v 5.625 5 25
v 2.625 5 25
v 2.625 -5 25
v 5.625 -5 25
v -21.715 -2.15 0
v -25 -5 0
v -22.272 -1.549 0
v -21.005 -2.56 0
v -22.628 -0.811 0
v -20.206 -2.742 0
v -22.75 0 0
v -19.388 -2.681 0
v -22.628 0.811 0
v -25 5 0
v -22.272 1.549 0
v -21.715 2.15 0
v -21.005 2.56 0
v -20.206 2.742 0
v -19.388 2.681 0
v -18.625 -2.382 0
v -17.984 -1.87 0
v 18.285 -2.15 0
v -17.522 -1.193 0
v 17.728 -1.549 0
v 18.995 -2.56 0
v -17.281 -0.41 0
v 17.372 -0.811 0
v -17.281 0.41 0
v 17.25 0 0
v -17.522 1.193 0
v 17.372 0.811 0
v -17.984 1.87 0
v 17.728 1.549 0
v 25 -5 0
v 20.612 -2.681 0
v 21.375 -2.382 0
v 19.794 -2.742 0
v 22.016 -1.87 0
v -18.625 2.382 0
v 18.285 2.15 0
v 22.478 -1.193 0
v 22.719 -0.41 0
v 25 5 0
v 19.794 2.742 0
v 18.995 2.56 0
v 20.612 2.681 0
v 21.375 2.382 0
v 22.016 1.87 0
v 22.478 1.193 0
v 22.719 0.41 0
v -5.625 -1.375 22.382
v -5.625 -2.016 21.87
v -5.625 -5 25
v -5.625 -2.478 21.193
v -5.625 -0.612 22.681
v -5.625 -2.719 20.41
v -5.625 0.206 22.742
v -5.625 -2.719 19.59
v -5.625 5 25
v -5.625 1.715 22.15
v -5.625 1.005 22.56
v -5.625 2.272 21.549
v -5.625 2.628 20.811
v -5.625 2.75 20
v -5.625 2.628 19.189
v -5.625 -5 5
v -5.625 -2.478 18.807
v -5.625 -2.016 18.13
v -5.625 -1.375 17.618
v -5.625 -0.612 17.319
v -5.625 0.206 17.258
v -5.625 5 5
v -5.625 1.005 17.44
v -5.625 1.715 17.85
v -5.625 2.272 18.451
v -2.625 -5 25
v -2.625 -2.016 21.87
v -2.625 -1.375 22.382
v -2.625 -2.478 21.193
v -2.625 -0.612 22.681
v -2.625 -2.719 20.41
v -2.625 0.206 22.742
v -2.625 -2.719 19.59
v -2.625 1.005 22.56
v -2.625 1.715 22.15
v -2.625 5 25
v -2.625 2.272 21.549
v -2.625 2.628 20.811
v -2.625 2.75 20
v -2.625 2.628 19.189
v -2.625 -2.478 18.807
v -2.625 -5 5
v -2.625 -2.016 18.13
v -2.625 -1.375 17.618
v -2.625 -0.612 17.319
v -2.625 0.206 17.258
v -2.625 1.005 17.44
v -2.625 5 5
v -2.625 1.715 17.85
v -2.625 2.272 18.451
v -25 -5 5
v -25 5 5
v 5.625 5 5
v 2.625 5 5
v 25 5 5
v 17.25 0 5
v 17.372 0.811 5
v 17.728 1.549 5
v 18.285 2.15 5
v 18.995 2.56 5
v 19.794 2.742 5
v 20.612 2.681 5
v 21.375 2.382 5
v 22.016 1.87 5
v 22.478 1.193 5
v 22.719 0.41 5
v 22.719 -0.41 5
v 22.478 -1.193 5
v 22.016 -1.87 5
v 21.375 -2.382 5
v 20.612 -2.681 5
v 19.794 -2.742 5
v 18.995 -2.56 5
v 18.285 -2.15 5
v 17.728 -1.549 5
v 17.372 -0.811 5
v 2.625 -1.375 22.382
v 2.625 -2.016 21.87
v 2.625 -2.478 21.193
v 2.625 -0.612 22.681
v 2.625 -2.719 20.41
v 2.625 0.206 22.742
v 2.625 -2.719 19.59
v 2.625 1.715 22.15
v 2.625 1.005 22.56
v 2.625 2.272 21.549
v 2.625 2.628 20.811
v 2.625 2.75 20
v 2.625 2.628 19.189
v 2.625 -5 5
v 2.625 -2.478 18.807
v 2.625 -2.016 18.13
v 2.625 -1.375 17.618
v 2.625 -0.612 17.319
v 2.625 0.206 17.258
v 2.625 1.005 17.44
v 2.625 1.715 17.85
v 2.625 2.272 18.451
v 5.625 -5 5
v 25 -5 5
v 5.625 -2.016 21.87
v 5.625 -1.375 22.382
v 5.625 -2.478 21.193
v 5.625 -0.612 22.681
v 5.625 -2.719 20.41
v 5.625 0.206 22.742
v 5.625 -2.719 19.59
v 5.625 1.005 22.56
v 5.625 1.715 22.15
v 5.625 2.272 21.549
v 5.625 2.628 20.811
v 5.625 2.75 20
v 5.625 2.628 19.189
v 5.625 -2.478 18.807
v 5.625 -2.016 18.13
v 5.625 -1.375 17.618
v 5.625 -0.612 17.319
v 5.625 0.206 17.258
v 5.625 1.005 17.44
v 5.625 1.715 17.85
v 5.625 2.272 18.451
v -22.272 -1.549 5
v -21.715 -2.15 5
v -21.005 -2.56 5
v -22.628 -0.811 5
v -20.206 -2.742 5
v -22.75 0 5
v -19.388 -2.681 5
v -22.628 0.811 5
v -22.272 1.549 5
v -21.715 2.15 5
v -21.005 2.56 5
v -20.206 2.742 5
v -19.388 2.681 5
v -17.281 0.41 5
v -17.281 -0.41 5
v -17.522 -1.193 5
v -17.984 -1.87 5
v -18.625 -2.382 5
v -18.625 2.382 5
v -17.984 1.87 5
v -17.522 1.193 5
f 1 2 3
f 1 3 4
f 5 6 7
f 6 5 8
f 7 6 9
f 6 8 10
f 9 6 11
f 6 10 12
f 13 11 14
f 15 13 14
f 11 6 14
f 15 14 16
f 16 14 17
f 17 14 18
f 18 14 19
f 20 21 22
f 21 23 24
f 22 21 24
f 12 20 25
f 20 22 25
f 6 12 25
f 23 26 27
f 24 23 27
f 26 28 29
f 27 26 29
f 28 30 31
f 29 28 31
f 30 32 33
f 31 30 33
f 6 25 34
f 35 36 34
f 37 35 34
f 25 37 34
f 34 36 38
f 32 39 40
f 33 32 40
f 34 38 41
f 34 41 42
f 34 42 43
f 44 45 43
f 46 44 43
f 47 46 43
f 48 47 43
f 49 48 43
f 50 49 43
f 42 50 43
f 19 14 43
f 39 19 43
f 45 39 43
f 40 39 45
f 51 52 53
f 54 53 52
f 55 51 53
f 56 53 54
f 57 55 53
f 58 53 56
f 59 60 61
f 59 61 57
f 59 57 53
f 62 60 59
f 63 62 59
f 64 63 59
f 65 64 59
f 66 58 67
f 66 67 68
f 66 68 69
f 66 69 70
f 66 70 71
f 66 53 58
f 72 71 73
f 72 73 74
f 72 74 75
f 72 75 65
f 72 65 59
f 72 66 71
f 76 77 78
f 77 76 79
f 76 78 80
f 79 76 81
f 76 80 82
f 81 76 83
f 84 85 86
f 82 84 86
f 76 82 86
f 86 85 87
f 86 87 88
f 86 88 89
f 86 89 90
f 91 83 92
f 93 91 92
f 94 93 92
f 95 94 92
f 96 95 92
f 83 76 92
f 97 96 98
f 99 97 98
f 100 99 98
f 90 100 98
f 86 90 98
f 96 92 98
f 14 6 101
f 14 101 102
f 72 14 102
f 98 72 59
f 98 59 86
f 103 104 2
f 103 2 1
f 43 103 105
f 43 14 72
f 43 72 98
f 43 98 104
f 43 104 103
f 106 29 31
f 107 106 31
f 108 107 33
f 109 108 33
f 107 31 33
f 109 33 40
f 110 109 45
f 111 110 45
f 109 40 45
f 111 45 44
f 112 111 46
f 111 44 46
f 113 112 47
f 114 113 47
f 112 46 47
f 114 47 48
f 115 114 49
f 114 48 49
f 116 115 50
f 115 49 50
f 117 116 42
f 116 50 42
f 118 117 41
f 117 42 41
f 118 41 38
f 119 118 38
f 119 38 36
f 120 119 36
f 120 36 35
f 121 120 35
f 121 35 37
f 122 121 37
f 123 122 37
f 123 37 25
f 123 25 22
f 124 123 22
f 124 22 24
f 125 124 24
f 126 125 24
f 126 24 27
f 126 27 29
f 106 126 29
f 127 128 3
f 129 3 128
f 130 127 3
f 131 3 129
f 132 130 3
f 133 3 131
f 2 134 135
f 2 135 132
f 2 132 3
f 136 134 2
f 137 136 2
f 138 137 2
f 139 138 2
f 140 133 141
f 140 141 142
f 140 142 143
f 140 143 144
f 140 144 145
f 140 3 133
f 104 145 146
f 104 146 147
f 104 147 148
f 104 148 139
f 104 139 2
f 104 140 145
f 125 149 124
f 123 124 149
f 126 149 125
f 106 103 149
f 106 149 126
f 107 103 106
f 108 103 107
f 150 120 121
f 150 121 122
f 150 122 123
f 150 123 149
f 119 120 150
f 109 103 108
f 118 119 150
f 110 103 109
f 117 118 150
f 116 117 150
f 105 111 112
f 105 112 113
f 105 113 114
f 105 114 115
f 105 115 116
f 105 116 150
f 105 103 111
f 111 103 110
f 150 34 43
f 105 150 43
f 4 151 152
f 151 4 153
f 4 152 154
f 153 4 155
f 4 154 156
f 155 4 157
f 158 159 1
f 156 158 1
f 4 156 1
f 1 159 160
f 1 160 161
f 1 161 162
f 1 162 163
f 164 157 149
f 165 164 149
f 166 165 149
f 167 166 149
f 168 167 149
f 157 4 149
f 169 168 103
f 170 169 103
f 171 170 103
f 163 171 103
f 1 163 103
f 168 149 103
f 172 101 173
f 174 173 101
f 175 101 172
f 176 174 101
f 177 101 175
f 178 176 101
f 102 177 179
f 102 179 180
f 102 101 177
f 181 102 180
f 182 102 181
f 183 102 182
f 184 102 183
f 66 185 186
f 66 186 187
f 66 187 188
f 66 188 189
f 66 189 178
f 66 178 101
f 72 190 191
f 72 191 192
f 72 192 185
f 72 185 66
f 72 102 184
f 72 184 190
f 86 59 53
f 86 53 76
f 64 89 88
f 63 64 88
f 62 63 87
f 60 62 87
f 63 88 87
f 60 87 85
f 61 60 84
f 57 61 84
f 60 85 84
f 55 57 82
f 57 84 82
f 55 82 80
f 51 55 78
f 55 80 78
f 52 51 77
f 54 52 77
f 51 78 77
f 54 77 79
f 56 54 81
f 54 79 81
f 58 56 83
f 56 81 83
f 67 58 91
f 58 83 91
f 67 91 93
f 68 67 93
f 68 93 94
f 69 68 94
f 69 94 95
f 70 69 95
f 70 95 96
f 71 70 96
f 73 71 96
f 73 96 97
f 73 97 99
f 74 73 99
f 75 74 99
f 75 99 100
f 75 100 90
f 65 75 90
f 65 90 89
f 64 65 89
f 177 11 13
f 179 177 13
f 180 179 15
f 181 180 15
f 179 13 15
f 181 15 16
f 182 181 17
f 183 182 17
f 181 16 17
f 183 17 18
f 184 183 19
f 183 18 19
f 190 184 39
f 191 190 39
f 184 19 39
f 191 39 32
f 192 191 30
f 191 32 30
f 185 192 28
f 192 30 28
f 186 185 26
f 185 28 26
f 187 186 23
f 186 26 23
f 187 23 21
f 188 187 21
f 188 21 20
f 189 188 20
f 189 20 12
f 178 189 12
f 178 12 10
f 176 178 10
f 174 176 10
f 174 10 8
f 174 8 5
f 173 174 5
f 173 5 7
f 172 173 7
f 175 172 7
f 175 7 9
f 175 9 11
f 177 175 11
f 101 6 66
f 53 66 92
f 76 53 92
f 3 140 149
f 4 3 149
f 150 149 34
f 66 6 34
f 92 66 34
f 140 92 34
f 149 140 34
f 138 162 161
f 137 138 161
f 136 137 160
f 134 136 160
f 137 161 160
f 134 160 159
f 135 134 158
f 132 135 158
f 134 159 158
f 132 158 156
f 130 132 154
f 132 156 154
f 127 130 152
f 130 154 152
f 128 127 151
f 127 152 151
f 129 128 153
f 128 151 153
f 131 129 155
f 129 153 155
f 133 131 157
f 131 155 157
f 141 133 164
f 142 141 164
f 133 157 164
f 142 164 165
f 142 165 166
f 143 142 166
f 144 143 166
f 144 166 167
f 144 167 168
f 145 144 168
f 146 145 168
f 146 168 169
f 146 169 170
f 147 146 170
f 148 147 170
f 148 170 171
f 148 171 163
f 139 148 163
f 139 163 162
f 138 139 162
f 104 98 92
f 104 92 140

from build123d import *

# Parameters (mm, degrees)
F0_W     = 50
F0_H     = 10
F1_DEPTH = 5
F3_D     = 5.5
F4_W     = 3
F4_H     = 10
F5_DEPTH = 20
F7_D     = 5.5


with BuildPart() as f1:
    # F0 (on Top) → F1 (new body)
    with BuildSketch(Plane.XY):
        Rectangle(F0_W, F0_H)
    extrude(amount=F1_DEPTH)

    # F3 (through all)
    with Locations(Plane.XY.offset(5)):
        with Locations((-20, 0), (20, 0)):
            Hole(F3_D / 2)

    # F4 (on face) → F5 (join)
    with BuildSketch(Plane.XY.offset(5)):
        with Locations((-4.125, 0)):
            Rectangle(F4_W, F4_H)
        with Locations((4.125, 0)):
            Rectangle(F4_W, F4_H)
    extrude(amount=F5_DEPTH)

    # F7 (through all)
    with Locations(Plane(origin=(-5.625, 0, 0), x_dir=(0, -1, 0), z_dir=(-1, 0, 0))):
        with Locations((0, 20)):
            Hole(F7_D / 2)


solid = f1.part
